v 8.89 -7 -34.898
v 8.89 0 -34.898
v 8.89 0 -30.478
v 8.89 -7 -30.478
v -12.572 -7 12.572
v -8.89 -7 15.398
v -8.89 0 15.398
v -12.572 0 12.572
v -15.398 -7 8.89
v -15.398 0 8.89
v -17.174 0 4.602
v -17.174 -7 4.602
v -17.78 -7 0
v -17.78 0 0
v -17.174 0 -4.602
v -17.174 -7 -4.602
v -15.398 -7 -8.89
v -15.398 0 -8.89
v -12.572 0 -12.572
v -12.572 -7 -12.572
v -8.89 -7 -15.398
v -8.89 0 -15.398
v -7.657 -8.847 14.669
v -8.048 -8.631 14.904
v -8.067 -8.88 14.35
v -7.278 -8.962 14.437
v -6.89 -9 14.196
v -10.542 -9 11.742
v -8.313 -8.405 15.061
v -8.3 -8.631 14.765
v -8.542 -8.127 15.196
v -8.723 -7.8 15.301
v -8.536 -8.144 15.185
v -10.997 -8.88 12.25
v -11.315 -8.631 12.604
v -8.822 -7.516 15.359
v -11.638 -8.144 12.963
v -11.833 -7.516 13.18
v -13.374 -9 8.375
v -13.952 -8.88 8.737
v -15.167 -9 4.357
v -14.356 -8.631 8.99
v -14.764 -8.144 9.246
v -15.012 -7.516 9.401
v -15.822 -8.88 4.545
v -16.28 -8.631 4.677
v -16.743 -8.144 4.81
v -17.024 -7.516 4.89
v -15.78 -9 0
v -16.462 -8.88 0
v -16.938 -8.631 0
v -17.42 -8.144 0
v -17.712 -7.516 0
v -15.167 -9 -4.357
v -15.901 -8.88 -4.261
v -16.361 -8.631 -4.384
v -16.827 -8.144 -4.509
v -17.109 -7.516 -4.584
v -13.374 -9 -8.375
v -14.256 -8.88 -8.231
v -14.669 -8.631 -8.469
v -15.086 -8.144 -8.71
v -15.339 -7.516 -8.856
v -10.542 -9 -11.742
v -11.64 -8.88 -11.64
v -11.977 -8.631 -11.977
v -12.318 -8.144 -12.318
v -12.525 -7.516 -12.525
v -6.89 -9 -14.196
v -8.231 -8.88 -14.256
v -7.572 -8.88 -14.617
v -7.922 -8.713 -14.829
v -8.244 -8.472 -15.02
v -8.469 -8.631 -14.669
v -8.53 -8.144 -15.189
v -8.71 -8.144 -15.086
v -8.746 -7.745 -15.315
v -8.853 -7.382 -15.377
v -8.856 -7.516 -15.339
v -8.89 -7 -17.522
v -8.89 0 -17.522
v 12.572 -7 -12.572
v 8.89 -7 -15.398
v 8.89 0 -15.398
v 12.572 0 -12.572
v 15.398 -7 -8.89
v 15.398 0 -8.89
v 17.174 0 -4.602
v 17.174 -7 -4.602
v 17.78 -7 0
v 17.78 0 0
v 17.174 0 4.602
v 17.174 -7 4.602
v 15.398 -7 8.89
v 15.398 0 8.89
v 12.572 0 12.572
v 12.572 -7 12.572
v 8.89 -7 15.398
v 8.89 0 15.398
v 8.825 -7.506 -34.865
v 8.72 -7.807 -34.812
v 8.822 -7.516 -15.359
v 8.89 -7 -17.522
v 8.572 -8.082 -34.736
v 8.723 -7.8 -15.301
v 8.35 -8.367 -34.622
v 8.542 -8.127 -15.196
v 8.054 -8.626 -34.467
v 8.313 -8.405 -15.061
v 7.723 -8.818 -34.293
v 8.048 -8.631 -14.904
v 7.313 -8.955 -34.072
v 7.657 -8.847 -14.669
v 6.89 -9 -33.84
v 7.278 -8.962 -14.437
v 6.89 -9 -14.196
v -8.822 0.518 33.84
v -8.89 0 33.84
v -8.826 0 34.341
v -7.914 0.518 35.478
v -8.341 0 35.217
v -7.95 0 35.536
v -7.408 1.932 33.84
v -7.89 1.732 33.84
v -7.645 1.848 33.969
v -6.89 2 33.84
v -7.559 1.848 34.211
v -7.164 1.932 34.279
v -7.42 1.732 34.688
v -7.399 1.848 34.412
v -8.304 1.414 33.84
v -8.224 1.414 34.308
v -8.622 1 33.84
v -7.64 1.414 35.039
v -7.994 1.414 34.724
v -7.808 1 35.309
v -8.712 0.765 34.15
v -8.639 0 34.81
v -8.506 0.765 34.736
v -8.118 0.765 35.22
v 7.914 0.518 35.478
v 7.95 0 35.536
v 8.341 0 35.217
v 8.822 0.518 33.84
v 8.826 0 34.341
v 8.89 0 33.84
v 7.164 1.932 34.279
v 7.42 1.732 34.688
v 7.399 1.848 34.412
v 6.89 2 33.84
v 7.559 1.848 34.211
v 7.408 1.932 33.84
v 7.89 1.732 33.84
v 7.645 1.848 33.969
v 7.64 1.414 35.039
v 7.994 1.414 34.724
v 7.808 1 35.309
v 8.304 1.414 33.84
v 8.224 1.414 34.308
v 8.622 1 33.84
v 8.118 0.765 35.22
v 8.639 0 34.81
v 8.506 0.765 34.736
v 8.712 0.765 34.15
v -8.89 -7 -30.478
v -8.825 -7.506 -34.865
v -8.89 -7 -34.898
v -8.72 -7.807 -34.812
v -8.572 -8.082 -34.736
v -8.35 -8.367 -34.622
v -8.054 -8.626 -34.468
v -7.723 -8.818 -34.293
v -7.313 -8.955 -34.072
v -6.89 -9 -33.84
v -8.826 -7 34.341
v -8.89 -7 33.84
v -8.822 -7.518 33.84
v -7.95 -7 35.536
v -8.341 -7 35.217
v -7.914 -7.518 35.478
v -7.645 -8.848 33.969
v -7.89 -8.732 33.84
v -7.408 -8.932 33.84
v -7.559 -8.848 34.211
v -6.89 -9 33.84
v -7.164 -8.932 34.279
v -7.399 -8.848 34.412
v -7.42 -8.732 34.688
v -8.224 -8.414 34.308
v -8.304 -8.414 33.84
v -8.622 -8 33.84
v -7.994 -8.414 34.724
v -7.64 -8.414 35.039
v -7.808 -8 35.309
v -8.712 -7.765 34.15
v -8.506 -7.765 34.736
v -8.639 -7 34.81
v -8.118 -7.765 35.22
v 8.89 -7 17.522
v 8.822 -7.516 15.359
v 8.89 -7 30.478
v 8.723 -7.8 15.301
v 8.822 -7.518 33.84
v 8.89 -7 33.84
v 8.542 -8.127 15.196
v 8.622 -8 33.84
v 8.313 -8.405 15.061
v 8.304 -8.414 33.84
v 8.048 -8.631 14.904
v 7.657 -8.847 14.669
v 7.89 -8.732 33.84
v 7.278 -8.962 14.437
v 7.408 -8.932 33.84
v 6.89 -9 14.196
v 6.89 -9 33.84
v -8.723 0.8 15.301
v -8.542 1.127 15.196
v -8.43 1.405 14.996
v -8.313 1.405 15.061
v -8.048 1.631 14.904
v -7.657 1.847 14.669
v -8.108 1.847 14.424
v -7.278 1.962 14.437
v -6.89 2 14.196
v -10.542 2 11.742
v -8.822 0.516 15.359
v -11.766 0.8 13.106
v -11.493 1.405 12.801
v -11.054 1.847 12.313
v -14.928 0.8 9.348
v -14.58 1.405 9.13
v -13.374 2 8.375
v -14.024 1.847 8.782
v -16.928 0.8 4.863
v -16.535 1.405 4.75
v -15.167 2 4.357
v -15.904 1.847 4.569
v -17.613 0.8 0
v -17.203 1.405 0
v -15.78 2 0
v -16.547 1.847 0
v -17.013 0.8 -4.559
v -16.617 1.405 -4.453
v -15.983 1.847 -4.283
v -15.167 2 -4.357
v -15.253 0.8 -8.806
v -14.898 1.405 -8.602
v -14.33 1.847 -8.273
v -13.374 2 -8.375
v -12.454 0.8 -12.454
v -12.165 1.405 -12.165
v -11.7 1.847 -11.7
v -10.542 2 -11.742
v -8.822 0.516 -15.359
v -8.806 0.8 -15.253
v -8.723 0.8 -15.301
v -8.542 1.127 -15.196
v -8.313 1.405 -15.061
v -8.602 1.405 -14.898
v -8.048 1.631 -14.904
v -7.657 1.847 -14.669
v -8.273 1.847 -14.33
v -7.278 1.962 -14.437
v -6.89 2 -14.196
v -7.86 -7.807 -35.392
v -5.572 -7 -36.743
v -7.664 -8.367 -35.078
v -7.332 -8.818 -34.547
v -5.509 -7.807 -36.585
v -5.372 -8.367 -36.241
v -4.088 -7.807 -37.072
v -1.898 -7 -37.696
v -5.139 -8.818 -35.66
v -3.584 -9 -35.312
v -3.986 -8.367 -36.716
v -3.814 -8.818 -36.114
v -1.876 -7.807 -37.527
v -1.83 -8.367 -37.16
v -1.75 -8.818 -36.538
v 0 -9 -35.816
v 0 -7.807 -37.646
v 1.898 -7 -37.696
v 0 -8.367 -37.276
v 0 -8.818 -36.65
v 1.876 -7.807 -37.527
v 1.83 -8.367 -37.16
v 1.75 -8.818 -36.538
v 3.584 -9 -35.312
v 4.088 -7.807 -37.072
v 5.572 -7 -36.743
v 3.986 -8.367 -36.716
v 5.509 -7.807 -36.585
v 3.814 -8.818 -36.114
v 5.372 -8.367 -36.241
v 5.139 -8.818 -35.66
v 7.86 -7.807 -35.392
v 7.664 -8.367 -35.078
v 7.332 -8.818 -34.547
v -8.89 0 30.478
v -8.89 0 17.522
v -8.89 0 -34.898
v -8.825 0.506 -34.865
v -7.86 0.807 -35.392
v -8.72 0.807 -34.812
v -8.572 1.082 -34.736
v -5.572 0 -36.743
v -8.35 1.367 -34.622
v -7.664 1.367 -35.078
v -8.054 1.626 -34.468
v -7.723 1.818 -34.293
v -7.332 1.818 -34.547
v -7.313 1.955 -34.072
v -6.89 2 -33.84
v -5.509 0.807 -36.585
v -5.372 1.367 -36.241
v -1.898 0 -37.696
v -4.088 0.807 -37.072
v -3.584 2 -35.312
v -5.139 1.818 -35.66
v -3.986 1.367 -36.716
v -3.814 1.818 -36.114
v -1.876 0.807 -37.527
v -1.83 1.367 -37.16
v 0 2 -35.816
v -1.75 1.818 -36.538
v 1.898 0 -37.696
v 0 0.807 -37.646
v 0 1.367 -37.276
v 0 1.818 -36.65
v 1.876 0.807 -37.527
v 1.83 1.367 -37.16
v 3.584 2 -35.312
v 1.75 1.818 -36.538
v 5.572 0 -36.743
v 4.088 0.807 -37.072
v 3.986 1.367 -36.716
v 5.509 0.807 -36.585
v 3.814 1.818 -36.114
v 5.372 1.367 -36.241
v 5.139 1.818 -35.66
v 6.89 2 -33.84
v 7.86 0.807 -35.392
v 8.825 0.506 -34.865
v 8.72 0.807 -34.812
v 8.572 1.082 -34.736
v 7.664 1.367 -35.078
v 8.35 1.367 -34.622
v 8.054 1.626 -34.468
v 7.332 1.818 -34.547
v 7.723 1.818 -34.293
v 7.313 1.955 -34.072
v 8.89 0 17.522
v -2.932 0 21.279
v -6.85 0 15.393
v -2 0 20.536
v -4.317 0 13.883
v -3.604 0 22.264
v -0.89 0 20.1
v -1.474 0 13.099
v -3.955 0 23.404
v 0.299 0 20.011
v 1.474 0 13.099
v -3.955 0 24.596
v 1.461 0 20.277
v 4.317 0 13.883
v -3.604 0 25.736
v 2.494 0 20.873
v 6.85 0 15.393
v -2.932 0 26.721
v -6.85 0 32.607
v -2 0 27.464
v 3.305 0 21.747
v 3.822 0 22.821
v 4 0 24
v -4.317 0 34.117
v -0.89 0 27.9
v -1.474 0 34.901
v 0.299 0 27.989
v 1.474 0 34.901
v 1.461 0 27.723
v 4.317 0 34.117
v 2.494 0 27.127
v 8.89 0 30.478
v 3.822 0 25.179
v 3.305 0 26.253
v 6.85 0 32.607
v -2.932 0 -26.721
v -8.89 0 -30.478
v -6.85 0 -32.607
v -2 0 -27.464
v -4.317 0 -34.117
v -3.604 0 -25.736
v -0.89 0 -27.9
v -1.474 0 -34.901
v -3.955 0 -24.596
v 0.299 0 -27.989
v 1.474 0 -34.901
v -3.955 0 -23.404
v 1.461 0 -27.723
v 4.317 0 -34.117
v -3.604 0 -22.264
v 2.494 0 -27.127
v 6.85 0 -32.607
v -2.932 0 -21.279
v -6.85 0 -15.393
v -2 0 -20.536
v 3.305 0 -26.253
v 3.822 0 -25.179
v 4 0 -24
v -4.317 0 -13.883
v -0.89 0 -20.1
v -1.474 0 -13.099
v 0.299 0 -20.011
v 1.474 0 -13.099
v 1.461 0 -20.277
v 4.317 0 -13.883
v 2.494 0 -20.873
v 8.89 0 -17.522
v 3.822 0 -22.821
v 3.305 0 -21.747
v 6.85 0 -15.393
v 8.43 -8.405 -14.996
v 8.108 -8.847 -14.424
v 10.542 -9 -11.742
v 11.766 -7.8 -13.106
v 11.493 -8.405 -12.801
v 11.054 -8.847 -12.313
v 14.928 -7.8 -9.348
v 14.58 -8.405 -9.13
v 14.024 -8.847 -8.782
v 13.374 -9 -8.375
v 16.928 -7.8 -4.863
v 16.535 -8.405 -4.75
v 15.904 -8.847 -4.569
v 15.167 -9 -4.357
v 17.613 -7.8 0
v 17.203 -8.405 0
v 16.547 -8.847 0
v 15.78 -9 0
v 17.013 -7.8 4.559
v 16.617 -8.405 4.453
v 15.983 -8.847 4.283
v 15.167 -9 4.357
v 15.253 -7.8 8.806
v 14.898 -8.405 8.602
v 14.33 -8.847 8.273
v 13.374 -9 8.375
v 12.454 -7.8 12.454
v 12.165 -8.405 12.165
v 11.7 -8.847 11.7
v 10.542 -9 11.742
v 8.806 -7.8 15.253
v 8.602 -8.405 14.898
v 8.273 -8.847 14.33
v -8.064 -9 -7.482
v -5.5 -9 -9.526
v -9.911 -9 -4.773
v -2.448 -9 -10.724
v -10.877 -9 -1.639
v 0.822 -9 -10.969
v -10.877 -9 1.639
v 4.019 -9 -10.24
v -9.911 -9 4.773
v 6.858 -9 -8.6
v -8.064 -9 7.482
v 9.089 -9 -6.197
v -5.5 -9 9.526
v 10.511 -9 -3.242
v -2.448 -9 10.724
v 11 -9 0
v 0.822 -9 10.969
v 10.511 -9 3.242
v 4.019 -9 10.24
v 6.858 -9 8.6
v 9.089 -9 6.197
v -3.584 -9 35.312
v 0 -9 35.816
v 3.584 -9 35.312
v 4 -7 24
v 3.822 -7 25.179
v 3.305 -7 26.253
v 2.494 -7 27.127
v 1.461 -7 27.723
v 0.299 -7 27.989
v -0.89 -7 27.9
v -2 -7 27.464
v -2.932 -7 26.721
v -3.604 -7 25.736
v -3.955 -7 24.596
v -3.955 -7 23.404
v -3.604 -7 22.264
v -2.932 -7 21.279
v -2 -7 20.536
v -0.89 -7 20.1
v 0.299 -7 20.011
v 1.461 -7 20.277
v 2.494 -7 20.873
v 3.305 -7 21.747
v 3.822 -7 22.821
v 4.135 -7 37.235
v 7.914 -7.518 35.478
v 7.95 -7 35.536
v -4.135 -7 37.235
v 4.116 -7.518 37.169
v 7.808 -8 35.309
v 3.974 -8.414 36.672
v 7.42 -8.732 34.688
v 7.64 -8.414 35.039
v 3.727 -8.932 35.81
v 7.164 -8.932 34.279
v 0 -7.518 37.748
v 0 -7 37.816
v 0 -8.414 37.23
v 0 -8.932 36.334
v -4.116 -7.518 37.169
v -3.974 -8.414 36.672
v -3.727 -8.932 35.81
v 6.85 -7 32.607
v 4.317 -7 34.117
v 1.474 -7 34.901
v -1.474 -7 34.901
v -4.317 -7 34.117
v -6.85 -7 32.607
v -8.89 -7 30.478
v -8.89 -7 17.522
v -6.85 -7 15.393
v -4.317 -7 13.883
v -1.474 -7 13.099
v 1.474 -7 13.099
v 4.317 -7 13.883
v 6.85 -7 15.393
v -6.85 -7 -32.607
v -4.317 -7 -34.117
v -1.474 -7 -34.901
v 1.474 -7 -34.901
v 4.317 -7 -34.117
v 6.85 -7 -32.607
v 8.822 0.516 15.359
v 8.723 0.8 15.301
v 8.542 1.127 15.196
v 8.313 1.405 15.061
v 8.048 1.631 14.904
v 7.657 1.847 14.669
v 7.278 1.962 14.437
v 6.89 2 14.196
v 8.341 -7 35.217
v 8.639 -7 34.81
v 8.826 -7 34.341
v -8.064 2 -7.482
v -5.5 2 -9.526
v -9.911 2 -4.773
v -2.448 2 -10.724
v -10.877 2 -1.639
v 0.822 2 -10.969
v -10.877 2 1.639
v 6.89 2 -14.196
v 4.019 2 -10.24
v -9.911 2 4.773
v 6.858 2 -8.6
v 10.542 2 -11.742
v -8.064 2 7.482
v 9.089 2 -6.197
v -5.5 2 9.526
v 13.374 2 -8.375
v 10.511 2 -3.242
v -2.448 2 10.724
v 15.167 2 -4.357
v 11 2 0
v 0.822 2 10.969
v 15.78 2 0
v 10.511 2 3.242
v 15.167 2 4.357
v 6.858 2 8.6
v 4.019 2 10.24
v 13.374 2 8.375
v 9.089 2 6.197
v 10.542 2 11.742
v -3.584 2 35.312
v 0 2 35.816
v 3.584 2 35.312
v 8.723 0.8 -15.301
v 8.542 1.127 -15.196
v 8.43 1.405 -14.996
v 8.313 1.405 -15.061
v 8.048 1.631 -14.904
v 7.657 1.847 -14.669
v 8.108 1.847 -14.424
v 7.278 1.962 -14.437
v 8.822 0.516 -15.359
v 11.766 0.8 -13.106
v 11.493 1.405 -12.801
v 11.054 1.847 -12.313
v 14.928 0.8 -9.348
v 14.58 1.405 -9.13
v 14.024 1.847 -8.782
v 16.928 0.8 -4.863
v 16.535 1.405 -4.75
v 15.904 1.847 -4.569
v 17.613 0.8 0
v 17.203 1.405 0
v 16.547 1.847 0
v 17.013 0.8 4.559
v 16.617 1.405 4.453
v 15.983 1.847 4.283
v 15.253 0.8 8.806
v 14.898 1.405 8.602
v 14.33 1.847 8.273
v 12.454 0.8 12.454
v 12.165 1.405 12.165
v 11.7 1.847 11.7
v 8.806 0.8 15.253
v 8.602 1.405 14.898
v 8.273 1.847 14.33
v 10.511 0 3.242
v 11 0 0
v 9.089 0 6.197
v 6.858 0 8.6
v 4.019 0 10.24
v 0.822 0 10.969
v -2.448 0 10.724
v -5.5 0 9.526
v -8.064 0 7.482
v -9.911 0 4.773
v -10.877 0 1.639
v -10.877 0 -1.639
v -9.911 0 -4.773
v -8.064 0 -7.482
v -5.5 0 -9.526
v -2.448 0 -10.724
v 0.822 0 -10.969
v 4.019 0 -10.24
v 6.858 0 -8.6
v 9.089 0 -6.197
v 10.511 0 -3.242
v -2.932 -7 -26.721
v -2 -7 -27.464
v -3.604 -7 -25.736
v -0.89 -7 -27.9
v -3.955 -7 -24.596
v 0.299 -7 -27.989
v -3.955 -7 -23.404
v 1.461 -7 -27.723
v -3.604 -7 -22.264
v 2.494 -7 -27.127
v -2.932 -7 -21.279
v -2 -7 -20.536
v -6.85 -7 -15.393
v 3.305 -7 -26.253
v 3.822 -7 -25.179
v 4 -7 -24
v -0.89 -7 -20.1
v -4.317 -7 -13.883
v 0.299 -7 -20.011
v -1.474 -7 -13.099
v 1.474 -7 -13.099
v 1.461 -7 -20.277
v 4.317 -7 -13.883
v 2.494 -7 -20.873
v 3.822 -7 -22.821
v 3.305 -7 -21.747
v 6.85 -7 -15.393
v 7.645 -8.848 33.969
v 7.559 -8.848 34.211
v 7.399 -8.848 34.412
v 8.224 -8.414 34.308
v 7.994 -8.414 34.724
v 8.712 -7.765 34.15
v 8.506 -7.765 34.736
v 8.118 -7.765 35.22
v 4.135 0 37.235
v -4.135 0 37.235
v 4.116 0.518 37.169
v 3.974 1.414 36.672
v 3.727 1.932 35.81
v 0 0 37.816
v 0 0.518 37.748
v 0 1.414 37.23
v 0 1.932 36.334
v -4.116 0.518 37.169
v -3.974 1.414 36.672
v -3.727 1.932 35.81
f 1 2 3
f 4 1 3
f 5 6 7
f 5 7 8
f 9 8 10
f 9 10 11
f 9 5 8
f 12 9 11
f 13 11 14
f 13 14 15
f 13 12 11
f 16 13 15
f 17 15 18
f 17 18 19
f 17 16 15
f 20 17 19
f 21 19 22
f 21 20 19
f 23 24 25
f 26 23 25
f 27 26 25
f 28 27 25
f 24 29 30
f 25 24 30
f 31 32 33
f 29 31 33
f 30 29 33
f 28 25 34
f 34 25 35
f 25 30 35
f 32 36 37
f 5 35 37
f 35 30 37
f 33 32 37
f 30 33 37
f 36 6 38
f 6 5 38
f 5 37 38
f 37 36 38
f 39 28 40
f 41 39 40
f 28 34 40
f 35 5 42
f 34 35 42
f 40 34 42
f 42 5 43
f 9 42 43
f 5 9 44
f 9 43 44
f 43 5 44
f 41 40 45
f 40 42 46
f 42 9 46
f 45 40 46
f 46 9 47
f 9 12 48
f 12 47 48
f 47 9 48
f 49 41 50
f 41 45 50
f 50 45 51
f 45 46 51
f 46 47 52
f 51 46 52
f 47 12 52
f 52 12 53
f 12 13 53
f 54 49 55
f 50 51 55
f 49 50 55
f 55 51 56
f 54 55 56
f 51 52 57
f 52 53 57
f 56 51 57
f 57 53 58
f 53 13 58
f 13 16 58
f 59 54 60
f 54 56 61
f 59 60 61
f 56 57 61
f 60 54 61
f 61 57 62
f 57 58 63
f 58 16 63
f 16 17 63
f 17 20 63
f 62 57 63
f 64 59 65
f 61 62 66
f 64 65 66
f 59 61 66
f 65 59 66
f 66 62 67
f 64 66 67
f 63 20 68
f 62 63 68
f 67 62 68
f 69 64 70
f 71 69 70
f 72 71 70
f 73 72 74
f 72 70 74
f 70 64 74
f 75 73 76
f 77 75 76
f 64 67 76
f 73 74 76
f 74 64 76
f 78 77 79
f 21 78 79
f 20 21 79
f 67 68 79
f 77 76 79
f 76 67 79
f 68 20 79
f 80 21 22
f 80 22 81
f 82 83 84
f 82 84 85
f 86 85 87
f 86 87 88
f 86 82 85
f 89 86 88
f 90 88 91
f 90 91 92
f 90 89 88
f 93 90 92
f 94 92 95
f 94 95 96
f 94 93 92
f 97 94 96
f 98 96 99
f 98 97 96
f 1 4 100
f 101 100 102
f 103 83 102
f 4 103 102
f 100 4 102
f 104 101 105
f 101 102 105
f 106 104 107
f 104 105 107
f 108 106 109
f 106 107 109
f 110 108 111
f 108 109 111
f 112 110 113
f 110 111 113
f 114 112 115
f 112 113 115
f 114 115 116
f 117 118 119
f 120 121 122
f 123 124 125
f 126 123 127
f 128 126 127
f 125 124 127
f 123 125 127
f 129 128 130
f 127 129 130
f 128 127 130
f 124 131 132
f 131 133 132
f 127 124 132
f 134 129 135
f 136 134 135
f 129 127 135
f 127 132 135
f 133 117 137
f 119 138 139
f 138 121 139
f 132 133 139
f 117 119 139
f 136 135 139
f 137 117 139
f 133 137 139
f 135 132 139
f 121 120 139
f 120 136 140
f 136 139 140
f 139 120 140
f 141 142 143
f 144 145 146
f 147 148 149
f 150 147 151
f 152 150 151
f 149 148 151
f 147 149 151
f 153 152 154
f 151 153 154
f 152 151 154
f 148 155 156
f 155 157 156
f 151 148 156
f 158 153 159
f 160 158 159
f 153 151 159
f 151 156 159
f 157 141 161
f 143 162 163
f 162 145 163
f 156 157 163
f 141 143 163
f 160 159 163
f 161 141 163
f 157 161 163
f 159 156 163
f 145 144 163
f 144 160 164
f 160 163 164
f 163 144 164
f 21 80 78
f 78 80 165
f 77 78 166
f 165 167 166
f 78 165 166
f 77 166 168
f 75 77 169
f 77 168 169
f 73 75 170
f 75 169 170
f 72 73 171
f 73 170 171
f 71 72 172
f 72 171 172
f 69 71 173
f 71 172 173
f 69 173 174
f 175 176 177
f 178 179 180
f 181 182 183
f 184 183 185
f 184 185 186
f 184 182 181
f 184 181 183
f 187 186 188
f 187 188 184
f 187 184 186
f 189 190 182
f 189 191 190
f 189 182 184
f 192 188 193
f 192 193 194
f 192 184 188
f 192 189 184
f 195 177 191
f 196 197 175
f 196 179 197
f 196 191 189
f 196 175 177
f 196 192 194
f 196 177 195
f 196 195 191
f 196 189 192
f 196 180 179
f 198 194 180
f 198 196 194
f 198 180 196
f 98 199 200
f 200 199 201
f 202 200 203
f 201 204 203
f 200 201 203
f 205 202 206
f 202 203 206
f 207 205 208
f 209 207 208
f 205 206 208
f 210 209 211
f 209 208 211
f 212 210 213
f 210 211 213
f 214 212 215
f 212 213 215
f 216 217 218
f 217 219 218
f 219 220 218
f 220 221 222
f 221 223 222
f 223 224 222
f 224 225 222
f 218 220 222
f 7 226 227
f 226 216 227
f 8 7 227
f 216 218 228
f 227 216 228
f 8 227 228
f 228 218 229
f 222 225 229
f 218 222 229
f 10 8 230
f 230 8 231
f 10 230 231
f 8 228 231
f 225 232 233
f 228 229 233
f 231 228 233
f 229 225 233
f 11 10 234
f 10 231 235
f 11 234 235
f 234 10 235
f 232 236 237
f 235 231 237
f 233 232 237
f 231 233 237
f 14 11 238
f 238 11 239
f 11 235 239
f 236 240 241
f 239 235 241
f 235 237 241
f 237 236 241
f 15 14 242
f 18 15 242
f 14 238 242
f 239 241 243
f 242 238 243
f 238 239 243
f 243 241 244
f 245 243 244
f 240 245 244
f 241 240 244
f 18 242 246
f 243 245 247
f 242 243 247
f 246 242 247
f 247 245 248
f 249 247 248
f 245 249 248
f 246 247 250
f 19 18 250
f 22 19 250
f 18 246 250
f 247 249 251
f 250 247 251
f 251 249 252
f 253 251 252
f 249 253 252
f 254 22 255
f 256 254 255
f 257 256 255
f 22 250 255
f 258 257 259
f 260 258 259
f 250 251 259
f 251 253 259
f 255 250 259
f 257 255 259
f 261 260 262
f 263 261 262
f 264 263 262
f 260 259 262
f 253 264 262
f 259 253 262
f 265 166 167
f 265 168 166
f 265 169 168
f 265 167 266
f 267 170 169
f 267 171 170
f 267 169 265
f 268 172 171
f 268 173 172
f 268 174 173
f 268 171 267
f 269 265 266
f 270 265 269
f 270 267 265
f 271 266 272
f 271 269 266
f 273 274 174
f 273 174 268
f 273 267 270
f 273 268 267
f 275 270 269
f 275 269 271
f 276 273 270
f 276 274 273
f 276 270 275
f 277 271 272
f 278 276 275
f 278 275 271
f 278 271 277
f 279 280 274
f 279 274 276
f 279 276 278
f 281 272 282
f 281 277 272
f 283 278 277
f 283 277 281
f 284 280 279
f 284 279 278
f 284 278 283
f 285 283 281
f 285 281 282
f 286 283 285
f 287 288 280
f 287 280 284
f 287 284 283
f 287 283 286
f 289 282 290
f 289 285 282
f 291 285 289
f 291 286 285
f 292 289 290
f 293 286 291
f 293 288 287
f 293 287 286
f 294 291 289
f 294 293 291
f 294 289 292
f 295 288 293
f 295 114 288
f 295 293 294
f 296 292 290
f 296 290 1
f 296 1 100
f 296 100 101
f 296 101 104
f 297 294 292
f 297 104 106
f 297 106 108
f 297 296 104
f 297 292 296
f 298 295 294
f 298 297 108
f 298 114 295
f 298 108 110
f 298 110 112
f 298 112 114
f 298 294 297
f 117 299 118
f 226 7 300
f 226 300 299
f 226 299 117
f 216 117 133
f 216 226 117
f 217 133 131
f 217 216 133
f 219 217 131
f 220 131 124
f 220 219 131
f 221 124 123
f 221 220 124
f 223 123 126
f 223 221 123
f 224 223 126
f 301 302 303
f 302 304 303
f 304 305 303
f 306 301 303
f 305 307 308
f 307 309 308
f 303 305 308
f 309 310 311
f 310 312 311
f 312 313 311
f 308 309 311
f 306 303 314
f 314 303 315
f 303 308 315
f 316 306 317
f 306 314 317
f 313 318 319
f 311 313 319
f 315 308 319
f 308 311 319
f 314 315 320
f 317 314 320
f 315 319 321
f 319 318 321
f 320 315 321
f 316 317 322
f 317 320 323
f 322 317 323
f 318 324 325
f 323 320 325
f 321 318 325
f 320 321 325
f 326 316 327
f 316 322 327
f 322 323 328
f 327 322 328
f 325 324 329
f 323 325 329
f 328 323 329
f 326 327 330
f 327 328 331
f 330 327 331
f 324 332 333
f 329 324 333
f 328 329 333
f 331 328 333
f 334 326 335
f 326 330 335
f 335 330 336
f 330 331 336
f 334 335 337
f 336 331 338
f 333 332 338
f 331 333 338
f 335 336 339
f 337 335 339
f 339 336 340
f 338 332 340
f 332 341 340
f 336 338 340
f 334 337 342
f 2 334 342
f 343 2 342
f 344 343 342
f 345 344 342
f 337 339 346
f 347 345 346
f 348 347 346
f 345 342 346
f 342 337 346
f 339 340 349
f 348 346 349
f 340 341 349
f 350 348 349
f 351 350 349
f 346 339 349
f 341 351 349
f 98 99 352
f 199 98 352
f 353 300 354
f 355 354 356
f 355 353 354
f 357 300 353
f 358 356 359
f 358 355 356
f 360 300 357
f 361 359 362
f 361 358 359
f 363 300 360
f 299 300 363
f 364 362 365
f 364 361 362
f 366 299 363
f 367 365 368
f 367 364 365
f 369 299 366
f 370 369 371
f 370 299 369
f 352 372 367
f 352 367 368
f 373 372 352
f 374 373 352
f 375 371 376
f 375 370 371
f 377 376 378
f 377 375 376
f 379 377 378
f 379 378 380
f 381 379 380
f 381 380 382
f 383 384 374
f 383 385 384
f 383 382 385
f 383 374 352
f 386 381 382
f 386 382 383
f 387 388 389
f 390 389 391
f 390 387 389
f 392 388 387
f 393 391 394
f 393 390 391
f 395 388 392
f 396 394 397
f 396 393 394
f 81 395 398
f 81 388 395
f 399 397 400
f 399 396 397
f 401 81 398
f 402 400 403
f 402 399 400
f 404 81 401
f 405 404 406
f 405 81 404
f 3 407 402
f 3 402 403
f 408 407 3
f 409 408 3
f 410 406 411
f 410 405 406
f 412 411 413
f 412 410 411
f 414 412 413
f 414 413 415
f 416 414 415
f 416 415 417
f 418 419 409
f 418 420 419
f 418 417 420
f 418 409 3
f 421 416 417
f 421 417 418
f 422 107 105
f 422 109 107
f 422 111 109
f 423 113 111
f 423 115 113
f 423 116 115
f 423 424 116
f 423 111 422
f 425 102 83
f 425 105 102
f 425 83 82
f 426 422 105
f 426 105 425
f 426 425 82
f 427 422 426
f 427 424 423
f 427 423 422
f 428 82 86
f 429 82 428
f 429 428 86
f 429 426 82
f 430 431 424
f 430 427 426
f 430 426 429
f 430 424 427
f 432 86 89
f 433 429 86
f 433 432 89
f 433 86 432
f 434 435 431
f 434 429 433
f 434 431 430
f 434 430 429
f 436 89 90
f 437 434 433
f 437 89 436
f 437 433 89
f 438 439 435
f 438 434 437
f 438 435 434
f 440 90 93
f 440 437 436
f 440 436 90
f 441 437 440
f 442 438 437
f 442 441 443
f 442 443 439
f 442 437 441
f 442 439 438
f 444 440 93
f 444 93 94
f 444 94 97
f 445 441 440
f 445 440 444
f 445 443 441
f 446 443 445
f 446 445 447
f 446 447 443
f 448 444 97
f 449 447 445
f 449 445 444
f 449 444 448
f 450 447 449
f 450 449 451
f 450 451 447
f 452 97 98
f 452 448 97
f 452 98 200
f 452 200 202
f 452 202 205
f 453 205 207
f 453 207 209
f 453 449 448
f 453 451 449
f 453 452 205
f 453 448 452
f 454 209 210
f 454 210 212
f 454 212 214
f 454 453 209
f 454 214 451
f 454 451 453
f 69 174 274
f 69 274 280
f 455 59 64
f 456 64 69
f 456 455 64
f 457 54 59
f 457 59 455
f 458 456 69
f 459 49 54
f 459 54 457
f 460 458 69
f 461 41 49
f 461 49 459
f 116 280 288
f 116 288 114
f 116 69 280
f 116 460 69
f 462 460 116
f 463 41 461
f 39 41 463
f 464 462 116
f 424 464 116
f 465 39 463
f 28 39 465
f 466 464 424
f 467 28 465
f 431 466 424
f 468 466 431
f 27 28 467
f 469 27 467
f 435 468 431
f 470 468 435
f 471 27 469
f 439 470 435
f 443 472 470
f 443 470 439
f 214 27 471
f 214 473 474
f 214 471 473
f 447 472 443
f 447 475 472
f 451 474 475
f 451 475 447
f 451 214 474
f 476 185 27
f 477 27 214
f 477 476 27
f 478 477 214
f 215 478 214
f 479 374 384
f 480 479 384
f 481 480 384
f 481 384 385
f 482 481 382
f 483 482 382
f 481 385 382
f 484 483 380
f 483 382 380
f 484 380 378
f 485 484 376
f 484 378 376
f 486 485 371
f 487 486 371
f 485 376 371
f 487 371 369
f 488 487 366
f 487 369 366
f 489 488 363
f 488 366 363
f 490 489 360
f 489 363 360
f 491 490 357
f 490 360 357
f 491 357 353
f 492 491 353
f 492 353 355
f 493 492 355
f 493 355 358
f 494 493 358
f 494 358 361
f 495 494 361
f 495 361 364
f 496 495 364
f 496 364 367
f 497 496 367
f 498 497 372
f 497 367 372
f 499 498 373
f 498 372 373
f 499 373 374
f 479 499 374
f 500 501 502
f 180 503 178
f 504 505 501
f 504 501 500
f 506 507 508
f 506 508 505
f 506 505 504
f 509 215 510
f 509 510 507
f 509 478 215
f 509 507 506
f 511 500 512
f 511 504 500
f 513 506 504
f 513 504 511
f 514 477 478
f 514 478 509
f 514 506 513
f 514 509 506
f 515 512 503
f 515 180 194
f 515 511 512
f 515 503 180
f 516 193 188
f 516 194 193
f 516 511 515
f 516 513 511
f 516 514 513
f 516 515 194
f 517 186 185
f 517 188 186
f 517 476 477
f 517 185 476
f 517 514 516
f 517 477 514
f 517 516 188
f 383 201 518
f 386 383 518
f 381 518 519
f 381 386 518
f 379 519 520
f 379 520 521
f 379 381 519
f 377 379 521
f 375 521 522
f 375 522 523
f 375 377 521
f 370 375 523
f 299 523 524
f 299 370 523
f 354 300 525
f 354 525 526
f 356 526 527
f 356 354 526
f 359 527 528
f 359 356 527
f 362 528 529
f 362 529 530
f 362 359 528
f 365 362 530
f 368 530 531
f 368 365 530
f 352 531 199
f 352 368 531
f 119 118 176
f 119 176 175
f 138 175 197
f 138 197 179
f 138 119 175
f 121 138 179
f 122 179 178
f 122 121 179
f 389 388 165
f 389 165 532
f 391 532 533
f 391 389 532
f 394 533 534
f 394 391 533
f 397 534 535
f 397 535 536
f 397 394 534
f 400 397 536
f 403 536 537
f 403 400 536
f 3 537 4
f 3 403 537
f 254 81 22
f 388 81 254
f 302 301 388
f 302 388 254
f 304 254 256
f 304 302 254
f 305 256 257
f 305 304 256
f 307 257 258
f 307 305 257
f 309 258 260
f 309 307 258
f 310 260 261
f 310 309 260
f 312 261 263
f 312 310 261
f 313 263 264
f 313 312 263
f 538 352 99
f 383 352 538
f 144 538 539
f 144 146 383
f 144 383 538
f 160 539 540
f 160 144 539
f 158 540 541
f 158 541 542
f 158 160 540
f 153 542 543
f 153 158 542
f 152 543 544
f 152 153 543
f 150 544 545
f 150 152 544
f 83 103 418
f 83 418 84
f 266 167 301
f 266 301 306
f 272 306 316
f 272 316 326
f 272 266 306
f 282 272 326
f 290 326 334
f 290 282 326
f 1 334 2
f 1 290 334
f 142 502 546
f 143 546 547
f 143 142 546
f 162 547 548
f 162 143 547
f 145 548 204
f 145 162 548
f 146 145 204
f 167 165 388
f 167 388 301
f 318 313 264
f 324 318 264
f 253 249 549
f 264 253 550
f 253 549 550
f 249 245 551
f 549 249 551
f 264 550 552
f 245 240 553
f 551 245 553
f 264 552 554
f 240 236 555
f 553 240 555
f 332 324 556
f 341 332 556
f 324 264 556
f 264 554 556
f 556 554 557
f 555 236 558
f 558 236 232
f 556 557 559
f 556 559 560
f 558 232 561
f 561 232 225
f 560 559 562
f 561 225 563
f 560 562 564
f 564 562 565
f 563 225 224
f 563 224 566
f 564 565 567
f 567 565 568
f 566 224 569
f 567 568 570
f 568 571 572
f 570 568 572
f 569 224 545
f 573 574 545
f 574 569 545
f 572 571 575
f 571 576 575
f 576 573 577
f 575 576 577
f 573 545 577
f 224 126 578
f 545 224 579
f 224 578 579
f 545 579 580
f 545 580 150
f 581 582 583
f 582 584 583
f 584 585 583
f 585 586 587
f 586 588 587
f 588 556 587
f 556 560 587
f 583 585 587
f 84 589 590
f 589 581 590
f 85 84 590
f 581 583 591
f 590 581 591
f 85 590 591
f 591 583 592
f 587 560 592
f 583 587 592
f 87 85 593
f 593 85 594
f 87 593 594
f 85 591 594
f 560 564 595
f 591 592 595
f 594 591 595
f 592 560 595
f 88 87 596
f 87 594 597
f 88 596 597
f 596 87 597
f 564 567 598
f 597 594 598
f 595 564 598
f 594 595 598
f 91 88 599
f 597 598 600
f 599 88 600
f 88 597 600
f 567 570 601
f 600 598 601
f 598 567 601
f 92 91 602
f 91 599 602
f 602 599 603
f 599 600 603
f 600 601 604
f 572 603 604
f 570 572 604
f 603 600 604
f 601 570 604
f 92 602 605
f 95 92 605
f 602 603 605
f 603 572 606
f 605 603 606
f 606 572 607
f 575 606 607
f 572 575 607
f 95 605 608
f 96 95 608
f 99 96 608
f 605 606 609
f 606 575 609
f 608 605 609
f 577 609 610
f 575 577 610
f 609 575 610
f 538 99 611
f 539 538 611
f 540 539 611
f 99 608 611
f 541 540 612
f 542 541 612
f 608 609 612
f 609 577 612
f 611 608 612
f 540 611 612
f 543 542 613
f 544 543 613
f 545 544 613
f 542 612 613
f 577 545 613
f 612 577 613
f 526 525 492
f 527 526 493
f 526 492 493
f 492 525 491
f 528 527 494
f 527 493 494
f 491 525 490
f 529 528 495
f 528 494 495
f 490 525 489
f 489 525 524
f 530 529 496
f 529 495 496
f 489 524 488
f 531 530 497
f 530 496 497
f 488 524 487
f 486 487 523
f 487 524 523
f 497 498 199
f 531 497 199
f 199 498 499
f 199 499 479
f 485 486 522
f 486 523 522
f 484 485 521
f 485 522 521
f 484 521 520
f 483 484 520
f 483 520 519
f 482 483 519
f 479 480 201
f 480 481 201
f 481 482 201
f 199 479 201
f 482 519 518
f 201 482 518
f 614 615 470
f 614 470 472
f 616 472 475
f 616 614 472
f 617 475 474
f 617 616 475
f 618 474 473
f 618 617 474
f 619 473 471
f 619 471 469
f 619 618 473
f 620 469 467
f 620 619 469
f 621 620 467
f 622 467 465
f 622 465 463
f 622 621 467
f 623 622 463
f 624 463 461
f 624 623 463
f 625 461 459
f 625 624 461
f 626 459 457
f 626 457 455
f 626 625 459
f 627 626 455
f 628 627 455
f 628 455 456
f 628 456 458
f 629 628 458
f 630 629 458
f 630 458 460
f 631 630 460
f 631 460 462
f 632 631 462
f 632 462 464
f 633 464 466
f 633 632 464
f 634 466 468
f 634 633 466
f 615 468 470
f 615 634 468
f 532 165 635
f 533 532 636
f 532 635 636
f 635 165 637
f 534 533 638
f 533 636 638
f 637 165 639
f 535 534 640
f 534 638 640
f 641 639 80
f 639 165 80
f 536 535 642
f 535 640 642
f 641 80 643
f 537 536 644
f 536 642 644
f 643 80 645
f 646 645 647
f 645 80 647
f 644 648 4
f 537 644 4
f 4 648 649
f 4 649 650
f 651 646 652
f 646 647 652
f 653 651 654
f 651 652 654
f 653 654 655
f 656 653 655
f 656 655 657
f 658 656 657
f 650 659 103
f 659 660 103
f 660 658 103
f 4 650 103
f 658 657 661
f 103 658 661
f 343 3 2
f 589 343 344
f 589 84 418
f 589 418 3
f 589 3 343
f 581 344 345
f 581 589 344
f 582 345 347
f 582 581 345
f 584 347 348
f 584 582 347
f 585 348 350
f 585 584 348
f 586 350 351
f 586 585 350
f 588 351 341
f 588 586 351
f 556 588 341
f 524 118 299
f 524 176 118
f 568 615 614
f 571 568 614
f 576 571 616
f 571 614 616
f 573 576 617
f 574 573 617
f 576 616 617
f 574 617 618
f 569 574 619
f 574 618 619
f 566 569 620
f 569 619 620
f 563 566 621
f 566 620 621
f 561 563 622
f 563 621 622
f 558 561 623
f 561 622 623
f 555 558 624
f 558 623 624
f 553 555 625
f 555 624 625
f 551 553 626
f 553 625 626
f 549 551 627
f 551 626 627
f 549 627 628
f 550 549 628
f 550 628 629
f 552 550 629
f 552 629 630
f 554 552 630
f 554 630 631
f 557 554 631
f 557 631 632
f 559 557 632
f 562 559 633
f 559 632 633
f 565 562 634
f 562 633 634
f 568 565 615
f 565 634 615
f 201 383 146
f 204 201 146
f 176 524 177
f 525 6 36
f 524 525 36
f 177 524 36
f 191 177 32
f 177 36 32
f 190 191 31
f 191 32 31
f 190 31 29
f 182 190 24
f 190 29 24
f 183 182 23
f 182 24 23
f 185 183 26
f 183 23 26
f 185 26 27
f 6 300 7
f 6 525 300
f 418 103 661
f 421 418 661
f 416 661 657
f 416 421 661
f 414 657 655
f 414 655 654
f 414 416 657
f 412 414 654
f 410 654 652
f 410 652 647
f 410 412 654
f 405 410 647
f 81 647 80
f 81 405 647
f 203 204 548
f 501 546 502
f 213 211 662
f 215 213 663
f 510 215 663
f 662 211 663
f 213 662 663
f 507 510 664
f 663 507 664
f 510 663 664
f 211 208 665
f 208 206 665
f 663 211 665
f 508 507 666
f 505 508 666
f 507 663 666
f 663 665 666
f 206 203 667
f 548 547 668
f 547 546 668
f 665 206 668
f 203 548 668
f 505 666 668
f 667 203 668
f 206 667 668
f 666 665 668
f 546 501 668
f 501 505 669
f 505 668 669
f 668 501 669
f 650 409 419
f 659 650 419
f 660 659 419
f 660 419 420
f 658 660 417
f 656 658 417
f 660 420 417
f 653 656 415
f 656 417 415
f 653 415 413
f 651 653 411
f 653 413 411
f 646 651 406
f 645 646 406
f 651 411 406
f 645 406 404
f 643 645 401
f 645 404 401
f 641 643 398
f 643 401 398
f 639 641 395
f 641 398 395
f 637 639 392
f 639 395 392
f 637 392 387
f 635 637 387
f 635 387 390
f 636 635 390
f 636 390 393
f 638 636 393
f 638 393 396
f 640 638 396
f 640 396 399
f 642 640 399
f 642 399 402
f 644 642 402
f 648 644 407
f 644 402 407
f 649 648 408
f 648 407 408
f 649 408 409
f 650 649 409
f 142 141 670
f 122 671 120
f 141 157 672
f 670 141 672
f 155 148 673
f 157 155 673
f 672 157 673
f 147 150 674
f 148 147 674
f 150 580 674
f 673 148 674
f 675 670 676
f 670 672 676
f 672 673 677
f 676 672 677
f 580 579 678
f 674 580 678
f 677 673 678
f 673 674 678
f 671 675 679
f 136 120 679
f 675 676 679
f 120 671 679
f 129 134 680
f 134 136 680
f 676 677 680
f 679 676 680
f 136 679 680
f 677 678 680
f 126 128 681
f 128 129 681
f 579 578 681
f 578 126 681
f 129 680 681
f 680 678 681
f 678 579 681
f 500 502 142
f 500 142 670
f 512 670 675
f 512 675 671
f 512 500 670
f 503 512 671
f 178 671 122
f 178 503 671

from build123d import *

# Parameters (mm, degrees)
F1_R          = 11
F1_R_2        = 4
F2_DEPTH      = 7
F0_R          = 11
F3_DEPTH      = 9
F3_DEPTH_BACK = 2
F4_R          = 2


with BuildPart() as f2:
    # F1 (on Front) → F2 (new body)
    with BuildSketch(Plane.XZ):
        with Locations((0, 24)):
            Circle(F1_R)
        with Locations((0, 24)):
            Circle(F1_R_2, mode=Mode.SUBTRACT)
        with Locations((0, -24)):
            Circle(F1_R)
        with Locations((0, -24)):
            Circle(F1_R_2, mode=Mode.SUBTRACT)
    extrude(amount=F2_DEPTH)


with BuildPart() as f3:
    # F0 (on Front) → F3 (new body, two sides)
    with BuildSketch(Plane.XZ) as f3_sk:
        with BuildLine():
            Line((-8.89, 34.897932), (-8.89, 15.397932))
            ThreePointArc((-8.89, 15.397932), (-17.78, 0), (-8.89, -15.397932))
            Line((-8.89, -15.397932), (-8.89, -34.897932))
            ThreePointArc((-8.89, -34.897932), (0, -37.816214), (8.89, -34.897932))
            Line((8.89, -34.897932), (8.89, -15.397932))
            ThreePointArc((8.89, -15.397932), (17.78, 0), (8.89, 15.397932))
            Line((8.89, 15.397932), (8.89, 34.897932))
            ThreePointArc((8.89, 34.897932), (0, 37.816214), (-8.89, 34.897932))
        make_face()
        Circle(F0_R, mode=Mode.SUBTRACT)
    extrude(amount=F3_DEPTH)
    extrude(f3_sk.sketch, amount=-F3_DEPTH_BACK)

    # F4
    f4_edges = [f3.edges().sort_by_distance(p)[0] for p in [
        (-8.89, -9, 25.147932),
        (-17.78, -9, 0),
        (8.89, -9, 25.147932),
        (17.78, -9, 0),
        (0, -9, 37.816214),
        (0, -9, -37.816214),
        (8.89, -9, -25.147932),
        (-8.89, -9, -25.147932),
        (-8.89, 2, 25.147932),
        (0, 2, 37.816214),
        (-17.78, 2, 0),
        (-8.89, 2, -25.147932),
        (0, 2, -37.816214),
        (8.89, 2, 25.147932),
        (17.78, 2, 0),
        (8.89, 2, -25.147932),
        (-8.89, -3.5, 34.897932),
        (8.89, -3.5, 34.897932),
    ]]
    fillet(f4_edges, radius=F4_R)

    # F5: cut F2
    add(f2.part, mode=Mode.SUBTRACT)


solid = f3.part
